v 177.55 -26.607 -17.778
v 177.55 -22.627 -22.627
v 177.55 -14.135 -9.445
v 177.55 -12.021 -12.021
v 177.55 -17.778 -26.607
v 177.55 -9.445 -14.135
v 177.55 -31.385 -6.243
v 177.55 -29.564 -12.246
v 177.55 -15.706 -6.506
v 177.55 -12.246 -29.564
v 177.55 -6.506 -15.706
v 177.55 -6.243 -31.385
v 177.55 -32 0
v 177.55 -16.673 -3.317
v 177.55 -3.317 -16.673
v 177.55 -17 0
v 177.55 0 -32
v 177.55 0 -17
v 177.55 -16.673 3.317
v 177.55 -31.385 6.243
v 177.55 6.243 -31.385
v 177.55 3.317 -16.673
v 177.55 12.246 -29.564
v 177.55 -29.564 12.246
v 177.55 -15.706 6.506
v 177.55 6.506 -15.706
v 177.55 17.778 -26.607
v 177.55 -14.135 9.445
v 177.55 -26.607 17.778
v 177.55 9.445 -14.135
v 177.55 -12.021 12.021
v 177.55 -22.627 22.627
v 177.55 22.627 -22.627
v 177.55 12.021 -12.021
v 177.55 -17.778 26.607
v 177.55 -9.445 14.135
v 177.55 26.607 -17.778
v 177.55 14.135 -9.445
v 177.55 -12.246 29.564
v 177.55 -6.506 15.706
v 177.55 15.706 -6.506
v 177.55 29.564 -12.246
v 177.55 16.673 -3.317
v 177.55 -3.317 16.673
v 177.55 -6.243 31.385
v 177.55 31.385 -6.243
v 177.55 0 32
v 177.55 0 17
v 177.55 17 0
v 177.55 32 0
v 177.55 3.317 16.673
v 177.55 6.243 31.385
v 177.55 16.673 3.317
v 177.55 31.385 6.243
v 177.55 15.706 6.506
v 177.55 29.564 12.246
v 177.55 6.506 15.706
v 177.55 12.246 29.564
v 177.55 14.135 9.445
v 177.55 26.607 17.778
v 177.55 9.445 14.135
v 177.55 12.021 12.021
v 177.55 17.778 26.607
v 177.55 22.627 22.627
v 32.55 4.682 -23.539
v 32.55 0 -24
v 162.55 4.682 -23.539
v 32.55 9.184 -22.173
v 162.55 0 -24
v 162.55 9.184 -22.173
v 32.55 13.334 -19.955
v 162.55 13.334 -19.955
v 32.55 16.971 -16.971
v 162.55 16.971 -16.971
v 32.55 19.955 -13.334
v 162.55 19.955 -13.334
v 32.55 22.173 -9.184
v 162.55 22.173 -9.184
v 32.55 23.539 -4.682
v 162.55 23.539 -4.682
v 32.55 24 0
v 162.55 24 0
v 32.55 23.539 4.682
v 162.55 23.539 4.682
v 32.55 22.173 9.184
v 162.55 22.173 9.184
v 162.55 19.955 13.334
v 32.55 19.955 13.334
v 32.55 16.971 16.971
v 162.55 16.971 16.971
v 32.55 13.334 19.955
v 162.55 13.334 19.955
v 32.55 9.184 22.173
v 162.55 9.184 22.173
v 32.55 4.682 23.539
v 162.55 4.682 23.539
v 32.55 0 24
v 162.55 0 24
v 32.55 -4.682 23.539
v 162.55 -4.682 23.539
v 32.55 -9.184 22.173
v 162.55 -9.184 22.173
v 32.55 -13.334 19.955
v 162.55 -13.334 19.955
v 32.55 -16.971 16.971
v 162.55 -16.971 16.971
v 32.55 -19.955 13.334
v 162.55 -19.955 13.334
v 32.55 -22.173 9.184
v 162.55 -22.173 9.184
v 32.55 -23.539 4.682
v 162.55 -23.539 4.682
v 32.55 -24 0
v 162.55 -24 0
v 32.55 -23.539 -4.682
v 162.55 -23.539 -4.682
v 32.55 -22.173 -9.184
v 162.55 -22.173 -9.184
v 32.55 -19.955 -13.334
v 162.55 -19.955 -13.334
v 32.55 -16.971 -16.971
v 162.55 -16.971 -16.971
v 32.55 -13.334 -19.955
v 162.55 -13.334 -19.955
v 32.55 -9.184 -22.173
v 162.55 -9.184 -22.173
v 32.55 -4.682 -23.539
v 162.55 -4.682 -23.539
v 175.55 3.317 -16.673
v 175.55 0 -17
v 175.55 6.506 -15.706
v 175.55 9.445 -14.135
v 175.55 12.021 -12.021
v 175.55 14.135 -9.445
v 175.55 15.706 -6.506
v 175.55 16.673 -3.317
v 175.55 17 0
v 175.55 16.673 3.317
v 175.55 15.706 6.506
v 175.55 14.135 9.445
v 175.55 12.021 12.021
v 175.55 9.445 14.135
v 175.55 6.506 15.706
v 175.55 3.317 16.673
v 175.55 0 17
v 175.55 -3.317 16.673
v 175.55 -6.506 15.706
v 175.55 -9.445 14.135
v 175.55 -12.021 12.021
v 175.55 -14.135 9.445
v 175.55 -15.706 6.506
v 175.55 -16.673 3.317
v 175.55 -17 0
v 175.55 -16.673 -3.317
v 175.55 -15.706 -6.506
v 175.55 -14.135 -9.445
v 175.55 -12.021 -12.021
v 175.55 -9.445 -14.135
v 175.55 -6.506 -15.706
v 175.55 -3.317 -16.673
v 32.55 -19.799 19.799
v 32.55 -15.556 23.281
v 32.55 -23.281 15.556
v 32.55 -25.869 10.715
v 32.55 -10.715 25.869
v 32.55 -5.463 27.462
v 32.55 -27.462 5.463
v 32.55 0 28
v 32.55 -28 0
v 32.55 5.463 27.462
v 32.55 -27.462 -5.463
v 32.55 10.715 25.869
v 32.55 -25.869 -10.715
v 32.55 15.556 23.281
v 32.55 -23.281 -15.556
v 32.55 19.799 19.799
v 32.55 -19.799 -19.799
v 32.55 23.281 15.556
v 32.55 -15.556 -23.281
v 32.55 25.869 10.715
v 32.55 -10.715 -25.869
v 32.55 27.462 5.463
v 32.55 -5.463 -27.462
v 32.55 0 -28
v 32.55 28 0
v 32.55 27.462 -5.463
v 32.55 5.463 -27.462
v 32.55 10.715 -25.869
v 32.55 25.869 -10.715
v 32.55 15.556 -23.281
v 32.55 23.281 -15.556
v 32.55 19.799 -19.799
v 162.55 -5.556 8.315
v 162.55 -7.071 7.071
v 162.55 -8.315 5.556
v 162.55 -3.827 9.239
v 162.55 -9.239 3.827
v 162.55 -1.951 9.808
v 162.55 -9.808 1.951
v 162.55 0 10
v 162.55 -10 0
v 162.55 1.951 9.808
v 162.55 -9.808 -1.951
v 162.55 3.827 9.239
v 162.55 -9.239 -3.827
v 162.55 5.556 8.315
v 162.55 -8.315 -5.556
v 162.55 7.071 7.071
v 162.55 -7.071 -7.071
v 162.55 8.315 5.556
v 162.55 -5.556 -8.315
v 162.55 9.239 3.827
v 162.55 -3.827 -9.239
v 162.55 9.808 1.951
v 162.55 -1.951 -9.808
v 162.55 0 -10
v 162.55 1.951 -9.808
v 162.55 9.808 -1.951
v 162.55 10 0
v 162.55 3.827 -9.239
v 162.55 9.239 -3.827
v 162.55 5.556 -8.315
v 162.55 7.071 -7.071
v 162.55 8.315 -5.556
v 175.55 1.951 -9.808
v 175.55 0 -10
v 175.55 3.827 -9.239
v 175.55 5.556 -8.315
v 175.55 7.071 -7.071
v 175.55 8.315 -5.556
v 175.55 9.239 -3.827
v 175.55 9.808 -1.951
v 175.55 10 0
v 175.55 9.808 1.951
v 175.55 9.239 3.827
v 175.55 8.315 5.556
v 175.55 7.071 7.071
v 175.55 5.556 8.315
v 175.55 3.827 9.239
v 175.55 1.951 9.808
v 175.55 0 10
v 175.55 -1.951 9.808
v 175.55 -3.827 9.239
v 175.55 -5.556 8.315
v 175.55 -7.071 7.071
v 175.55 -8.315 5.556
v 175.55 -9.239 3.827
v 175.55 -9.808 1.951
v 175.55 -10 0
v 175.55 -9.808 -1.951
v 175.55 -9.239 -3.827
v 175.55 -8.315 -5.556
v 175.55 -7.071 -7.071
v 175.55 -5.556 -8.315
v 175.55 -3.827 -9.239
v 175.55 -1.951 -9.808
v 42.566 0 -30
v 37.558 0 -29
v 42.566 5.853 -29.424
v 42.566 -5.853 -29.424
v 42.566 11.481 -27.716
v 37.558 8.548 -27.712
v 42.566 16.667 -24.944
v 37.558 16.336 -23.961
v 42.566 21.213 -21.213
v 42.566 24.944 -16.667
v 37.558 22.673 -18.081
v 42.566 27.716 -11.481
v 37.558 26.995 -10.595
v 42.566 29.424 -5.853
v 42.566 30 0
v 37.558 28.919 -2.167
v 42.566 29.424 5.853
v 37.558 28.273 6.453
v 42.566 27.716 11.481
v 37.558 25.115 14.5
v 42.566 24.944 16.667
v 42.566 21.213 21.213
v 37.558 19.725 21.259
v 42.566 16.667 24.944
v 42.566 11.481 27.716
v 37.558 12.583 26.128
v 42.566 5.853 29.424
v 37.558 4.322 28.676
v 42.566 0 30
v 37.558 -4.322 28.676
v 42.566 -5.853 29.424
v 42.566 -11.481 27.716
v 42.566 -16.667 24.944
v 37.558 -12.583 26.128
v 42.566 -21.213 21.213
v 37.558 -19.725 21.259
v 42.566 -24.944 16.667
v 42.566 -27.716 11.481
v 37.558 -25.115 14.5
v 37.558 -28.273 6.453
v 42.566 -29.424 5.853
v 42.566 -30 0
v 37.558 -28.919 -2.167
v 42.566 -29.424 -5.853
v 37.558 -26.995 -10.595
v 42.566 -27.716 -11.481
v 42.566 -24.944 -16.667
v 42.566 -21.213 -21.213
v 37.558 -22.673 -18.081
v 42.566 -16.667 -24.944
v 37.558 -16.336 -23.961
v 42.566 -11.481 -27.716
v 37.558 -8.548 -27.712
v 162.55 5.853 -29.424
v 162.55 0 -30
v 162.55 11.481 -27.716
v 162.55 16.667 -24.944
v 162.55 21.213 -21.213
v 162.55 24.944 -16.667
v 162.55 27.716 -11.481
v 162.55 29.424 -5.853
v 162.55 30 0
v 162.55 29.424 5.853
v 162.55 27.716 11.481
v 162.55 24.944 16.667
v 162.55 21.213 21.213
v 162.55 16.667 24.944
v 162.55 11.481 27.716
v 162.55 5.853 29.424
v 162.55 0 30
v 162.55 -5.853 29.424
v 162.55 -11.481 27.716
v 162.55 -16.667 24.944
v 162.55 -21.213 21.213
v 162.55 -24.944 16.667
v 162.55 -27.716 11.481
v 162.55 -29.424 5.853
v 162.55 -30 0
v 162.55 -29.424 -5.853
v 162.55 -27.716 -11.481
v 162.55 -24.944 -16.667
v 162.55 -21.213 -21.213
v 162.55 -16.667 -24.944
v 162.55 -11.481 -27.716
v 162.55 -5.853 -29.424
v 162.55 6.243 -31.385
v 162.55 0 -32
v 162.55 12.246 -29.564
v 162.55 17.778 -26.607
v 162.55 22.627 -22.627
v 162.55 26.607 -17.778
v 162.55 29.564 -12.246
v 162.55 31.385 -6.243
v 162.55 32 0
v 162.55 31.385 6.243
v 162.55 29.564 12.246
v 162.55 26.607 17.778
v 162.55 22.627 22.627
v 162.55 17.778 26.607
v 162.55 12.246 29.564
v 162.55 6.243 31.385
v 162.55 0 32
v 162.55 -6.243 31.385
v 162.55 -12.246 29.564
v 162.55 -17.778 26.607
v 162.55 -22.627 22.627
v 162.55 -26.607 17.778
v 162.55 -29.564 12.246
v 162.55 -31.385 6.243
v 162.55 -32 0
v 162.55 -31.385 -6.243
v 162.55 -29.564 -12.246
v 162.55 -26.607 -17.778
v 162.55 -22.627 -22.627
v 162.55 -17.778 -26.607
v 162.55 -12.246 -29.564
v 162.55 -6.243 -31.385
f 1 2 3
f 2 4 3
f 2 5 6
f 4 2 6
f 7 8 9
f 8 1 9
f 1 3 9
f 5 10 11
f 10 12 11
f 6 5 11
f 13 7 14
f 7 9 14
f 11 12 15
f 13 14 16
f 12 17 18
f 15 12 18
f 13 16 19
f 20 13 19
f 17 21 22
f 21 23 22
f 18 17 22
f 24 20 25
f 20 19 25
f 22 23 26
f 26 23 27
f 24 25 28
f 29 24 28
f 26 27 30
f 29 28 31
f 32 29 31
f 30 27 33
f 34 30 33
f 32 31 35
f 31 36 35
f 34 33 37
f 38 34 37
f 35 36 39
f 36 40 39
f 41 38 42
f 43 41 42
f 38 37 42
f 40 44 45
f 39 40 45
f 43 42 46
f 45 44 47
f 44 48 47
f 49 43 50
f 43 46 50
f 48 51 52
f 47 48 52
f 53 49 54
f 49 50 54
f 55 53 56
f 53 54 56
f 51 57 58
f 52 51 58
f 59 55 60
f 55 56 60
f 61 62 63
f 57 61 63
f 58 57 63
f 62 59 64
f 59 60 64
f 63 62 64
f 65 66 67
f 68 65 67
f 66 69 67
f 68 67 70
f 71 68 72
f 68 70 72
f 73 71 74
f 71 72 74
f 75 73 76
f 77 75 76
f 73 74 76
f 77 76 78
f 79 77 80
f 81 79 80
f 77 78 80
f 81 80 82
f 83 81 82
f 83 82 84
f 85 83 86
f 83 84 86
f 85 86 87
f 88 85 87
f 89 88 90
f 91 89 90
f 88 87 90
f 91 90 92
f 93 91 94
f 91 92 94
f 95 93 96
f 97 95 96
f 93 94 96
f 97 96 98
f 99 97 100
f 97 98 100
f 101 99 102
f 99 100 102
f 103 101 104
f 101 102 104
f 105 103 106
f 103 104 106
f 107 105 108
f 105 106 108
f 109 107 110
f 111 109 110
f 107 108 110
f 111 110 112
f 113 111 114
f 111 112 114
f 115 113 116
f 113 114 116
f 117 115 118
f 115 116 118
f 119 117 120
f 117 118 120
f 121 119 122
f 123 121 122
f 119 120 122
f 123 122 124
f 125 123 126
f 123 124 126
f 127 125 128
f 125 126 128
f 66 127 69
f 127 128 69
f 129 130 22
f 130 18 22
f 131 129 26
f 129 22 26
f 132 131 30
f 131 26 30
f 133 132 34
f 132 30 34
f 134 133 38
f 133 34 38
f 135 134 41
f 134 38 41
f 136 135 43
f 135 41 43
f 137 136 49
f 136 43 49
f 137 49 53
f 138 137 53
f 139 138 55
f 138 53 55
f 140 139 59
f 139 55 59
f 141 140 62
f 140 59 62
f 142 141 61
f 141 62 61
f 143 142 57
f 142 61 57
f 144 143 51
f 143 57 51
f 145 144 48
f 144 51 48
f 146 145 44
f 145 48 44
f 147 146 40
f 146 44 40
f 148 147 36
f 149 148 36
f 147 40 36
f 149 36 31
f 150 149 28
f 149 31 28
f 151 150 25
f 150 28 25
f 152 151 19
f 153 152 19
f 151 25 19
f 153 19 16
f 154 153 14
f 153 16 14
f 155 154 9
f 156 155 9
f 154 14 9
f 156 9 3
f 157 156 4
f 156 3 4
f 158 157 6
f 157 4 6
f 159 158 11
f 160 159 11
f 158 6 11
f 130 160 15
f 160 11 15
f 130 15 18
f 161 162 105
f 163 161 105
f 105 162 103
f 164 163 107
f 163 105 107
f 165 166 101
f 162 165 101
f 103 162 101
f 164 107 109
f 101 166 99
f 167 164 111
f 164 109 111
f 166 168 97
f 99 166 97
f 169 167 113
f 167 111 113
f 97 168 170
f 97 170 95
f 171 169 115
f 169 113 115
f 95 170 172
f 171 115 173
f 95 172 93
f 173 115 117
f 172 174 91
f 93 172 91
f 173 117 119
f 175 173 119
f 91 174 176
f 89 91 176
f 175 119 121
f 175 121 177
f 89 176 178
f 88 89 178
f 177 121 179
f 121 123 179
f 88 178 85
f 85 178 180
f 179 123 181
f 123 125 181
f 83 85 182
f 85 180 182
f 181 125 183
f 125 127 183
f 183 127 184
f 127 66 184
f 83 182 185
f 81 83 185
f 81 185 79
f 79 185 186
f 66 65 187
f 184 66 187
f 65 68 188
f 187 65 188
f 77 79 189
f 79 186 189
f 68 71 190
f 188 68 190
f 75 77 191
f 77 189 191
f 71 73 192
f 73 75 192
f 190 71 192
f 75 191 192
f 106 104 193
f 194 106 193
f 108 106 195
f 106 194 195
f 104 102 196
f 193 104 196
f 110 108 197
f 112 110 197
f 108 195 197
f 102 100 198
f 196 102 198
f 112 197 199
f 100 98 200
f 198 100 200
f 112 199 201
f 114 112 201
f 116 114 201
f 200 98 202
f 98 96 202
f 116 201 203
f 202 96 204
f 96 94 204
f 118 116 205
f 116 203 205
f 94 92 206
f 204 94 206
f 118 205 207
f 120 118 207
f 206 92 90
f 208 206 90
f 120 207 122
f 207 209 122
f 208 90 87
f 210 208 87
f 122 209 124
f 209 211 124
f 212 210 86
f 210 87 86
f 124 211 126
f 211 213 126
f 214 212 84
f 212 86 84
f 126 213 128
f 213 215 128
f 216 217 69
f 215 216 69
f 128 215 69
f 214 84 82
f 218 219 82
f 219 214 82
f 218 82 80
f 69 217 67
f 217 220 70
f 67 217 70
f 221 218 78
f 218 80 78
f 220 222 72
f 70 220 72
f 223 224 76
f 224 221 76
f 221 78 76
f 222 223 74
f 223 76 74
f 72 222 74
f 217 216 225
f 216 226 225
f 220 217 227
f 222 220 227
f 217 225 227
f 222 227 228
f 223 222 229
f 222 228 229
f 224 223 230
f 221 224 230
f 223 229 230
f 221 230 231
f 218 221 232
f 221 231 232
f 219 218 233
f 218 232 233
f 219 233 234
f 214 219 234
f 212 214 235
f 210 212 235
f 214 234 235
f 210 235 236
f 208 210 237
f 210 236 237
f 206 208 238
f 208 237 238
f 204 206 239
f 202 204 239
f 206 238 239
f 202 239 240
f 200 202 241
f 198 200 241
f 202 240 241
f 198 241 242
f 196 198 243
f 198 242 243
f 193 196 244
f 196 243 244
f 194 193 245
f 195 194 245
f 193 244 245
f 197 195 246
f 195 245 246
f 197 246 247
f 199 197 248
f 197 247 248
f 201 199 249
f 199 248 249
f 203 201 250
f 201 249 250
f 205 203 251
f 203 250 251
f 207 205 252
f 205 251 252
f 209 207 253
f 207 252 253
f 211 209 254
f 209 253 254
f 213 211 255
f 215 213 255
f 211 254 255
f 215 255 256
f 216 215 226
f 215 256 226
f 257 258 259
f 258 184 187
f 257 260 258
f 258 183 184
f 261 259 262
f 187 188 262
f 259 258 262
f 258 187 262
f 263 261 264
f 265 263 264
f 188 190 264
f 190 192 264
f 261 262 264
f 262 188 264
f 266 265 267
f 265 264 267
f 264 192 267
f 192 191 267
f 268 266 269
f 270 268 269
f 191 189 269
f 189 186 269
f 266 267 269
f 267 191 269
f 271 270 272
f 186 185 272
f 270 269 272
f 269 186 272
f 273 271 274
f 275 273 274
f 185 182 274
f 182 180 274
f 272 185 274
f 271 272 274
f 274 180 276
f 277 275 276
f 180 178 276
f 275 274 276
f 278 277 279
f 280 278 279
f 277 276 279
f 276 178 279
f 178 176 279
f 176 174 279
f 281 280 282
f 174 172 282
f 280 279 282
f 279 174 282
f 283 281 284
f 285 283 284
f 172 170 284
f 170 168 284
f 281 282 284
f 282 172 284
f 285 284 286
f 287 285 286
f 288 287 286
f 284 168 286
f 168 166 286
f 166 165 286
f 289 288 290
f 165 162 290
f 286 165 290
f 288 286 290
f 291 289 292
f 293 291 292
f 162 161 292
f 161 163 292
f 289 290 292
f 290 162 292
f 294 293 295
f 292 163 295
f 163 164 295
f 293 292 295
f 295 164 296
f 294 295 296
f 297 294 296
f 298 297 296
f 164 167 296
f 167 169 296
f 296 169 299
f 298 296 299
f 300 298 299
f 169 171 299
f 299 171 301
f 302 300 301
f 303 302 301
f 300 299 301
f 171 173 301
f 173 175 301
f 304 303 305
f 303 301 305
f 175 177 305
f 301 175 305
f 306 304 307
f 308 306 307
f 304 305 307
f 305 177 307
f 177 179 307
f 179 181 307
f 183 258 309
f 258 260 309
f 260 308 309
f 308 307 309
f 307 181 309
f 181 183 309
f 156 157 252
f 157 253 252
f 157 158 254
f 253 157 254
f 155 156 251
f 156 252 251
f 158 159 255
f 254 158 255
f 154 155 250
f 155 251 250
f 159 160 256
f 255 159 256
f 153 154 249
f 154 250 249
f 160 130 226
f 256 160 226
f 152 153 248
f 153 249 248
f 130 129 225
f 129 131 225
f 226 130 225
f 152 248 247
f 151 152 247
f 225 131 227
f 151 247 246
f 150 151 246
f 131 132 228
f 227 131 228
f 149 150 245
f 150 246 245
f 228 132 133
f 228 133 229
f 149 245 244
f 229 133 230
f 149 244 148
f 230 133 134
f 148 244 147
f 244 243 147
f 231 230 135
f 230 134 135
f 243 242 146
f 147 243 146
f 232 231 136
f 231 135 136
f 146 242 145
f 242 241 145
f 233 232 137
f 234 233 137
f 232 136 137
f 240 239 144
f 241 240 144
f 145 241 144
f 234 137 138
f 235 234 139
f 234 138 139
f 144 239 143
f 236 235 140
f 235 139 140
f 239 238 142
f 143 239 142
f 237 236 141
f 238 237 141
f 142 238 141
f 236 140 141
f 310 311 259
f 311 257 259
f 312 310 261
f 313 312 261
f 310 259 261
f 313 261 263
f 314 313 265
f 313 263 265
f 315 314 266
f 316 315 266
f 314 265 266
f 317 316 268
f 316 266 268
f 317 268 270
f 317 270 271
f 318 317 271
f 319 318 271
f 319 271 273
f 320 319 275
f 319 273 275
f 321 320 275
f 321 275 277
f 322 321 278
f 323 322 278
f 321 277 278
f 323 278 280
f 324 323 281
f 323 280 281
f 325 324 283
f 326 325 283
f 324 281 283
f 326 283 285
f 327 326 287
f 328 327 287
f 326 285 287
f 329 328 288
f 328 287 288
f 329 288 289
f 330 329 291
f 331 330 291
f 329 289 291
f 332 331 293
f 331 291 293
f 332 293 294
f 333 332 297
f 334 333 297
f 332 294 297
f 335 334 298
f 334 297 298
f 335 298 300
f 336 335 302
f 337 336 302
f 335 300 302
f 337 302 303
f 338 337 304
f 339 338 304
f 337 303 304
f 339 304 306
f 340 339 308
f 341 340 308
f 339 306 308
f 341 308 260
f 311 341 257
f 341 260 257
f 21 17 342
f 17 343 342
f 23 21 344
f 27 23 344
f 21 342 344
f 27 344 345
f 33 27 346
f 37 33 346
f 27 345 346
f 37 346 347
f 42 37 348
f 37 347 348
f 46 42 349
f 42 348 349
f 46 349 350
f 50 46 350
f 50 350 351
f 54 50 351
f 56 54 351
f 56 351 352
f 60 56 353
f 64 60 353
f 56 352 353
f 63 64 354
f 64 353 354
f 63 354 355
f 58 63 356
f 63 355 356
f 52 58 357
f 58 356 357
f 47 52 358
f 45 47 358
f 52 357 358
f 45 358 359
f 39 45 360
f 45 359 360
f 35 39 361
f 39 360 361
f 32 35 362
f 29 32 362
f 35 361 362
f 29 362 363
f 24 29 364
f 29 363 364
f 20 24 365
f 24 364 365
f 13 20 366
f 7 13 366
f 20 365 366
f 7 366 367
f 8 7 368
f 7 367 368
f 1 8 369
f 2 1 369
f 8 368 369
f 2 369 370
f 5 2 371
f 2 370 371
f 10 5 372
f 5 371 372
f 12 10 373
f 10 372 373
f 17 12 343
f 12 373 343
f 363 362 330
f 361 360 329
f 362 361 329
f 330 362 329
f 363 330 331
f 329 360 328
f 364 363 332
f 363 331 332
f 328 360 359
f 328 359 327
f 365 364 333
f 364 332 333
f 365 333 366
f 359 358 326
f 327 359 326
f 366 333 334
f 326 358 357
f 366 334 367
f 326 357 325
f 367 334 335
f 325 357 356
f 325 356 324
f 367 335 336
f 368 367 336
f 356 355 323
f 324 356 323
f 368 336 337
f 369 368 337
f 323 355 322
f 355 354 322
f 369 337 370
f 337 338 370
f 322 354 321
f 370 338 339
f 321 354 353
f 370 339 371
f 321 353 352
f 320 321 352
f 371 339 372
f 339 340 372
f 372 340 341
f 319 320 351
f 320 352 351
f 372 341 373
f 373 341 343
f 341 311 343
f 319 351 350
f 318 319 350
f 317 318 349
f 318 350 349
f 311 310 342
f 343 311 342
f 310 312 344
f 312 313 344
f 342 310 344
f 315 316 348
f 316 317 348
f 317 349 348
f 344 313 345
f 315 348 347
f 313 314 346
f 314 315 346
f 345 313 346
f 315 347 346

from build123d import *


with BuildPart() as part:
    # Esquisse1 → Révolution1 (revolve)
    with BuildSketch(Plane.XY, mode=Mode.PRIVATE) as r_volution1_sk:
        Polygon((175.54977417, 10), (175.54977417, 17), (177.54977417, 17), (177.54977417, 32), (162.54977417, 32), (162.54977417, 30), (42.566441994, 30), (32.54977417, 28), (32.54977417, 24), (162.54977417, 24), (162.54977417, 10), align=None)
    revolve(r_volution1_sk.sketch.rotate(Axis((32.54977417, 0, 0), (1, 0, 0)), 270), axis=Axis((32.54977417, 0, 0), (1, 0, 0)))


solid = part.part
